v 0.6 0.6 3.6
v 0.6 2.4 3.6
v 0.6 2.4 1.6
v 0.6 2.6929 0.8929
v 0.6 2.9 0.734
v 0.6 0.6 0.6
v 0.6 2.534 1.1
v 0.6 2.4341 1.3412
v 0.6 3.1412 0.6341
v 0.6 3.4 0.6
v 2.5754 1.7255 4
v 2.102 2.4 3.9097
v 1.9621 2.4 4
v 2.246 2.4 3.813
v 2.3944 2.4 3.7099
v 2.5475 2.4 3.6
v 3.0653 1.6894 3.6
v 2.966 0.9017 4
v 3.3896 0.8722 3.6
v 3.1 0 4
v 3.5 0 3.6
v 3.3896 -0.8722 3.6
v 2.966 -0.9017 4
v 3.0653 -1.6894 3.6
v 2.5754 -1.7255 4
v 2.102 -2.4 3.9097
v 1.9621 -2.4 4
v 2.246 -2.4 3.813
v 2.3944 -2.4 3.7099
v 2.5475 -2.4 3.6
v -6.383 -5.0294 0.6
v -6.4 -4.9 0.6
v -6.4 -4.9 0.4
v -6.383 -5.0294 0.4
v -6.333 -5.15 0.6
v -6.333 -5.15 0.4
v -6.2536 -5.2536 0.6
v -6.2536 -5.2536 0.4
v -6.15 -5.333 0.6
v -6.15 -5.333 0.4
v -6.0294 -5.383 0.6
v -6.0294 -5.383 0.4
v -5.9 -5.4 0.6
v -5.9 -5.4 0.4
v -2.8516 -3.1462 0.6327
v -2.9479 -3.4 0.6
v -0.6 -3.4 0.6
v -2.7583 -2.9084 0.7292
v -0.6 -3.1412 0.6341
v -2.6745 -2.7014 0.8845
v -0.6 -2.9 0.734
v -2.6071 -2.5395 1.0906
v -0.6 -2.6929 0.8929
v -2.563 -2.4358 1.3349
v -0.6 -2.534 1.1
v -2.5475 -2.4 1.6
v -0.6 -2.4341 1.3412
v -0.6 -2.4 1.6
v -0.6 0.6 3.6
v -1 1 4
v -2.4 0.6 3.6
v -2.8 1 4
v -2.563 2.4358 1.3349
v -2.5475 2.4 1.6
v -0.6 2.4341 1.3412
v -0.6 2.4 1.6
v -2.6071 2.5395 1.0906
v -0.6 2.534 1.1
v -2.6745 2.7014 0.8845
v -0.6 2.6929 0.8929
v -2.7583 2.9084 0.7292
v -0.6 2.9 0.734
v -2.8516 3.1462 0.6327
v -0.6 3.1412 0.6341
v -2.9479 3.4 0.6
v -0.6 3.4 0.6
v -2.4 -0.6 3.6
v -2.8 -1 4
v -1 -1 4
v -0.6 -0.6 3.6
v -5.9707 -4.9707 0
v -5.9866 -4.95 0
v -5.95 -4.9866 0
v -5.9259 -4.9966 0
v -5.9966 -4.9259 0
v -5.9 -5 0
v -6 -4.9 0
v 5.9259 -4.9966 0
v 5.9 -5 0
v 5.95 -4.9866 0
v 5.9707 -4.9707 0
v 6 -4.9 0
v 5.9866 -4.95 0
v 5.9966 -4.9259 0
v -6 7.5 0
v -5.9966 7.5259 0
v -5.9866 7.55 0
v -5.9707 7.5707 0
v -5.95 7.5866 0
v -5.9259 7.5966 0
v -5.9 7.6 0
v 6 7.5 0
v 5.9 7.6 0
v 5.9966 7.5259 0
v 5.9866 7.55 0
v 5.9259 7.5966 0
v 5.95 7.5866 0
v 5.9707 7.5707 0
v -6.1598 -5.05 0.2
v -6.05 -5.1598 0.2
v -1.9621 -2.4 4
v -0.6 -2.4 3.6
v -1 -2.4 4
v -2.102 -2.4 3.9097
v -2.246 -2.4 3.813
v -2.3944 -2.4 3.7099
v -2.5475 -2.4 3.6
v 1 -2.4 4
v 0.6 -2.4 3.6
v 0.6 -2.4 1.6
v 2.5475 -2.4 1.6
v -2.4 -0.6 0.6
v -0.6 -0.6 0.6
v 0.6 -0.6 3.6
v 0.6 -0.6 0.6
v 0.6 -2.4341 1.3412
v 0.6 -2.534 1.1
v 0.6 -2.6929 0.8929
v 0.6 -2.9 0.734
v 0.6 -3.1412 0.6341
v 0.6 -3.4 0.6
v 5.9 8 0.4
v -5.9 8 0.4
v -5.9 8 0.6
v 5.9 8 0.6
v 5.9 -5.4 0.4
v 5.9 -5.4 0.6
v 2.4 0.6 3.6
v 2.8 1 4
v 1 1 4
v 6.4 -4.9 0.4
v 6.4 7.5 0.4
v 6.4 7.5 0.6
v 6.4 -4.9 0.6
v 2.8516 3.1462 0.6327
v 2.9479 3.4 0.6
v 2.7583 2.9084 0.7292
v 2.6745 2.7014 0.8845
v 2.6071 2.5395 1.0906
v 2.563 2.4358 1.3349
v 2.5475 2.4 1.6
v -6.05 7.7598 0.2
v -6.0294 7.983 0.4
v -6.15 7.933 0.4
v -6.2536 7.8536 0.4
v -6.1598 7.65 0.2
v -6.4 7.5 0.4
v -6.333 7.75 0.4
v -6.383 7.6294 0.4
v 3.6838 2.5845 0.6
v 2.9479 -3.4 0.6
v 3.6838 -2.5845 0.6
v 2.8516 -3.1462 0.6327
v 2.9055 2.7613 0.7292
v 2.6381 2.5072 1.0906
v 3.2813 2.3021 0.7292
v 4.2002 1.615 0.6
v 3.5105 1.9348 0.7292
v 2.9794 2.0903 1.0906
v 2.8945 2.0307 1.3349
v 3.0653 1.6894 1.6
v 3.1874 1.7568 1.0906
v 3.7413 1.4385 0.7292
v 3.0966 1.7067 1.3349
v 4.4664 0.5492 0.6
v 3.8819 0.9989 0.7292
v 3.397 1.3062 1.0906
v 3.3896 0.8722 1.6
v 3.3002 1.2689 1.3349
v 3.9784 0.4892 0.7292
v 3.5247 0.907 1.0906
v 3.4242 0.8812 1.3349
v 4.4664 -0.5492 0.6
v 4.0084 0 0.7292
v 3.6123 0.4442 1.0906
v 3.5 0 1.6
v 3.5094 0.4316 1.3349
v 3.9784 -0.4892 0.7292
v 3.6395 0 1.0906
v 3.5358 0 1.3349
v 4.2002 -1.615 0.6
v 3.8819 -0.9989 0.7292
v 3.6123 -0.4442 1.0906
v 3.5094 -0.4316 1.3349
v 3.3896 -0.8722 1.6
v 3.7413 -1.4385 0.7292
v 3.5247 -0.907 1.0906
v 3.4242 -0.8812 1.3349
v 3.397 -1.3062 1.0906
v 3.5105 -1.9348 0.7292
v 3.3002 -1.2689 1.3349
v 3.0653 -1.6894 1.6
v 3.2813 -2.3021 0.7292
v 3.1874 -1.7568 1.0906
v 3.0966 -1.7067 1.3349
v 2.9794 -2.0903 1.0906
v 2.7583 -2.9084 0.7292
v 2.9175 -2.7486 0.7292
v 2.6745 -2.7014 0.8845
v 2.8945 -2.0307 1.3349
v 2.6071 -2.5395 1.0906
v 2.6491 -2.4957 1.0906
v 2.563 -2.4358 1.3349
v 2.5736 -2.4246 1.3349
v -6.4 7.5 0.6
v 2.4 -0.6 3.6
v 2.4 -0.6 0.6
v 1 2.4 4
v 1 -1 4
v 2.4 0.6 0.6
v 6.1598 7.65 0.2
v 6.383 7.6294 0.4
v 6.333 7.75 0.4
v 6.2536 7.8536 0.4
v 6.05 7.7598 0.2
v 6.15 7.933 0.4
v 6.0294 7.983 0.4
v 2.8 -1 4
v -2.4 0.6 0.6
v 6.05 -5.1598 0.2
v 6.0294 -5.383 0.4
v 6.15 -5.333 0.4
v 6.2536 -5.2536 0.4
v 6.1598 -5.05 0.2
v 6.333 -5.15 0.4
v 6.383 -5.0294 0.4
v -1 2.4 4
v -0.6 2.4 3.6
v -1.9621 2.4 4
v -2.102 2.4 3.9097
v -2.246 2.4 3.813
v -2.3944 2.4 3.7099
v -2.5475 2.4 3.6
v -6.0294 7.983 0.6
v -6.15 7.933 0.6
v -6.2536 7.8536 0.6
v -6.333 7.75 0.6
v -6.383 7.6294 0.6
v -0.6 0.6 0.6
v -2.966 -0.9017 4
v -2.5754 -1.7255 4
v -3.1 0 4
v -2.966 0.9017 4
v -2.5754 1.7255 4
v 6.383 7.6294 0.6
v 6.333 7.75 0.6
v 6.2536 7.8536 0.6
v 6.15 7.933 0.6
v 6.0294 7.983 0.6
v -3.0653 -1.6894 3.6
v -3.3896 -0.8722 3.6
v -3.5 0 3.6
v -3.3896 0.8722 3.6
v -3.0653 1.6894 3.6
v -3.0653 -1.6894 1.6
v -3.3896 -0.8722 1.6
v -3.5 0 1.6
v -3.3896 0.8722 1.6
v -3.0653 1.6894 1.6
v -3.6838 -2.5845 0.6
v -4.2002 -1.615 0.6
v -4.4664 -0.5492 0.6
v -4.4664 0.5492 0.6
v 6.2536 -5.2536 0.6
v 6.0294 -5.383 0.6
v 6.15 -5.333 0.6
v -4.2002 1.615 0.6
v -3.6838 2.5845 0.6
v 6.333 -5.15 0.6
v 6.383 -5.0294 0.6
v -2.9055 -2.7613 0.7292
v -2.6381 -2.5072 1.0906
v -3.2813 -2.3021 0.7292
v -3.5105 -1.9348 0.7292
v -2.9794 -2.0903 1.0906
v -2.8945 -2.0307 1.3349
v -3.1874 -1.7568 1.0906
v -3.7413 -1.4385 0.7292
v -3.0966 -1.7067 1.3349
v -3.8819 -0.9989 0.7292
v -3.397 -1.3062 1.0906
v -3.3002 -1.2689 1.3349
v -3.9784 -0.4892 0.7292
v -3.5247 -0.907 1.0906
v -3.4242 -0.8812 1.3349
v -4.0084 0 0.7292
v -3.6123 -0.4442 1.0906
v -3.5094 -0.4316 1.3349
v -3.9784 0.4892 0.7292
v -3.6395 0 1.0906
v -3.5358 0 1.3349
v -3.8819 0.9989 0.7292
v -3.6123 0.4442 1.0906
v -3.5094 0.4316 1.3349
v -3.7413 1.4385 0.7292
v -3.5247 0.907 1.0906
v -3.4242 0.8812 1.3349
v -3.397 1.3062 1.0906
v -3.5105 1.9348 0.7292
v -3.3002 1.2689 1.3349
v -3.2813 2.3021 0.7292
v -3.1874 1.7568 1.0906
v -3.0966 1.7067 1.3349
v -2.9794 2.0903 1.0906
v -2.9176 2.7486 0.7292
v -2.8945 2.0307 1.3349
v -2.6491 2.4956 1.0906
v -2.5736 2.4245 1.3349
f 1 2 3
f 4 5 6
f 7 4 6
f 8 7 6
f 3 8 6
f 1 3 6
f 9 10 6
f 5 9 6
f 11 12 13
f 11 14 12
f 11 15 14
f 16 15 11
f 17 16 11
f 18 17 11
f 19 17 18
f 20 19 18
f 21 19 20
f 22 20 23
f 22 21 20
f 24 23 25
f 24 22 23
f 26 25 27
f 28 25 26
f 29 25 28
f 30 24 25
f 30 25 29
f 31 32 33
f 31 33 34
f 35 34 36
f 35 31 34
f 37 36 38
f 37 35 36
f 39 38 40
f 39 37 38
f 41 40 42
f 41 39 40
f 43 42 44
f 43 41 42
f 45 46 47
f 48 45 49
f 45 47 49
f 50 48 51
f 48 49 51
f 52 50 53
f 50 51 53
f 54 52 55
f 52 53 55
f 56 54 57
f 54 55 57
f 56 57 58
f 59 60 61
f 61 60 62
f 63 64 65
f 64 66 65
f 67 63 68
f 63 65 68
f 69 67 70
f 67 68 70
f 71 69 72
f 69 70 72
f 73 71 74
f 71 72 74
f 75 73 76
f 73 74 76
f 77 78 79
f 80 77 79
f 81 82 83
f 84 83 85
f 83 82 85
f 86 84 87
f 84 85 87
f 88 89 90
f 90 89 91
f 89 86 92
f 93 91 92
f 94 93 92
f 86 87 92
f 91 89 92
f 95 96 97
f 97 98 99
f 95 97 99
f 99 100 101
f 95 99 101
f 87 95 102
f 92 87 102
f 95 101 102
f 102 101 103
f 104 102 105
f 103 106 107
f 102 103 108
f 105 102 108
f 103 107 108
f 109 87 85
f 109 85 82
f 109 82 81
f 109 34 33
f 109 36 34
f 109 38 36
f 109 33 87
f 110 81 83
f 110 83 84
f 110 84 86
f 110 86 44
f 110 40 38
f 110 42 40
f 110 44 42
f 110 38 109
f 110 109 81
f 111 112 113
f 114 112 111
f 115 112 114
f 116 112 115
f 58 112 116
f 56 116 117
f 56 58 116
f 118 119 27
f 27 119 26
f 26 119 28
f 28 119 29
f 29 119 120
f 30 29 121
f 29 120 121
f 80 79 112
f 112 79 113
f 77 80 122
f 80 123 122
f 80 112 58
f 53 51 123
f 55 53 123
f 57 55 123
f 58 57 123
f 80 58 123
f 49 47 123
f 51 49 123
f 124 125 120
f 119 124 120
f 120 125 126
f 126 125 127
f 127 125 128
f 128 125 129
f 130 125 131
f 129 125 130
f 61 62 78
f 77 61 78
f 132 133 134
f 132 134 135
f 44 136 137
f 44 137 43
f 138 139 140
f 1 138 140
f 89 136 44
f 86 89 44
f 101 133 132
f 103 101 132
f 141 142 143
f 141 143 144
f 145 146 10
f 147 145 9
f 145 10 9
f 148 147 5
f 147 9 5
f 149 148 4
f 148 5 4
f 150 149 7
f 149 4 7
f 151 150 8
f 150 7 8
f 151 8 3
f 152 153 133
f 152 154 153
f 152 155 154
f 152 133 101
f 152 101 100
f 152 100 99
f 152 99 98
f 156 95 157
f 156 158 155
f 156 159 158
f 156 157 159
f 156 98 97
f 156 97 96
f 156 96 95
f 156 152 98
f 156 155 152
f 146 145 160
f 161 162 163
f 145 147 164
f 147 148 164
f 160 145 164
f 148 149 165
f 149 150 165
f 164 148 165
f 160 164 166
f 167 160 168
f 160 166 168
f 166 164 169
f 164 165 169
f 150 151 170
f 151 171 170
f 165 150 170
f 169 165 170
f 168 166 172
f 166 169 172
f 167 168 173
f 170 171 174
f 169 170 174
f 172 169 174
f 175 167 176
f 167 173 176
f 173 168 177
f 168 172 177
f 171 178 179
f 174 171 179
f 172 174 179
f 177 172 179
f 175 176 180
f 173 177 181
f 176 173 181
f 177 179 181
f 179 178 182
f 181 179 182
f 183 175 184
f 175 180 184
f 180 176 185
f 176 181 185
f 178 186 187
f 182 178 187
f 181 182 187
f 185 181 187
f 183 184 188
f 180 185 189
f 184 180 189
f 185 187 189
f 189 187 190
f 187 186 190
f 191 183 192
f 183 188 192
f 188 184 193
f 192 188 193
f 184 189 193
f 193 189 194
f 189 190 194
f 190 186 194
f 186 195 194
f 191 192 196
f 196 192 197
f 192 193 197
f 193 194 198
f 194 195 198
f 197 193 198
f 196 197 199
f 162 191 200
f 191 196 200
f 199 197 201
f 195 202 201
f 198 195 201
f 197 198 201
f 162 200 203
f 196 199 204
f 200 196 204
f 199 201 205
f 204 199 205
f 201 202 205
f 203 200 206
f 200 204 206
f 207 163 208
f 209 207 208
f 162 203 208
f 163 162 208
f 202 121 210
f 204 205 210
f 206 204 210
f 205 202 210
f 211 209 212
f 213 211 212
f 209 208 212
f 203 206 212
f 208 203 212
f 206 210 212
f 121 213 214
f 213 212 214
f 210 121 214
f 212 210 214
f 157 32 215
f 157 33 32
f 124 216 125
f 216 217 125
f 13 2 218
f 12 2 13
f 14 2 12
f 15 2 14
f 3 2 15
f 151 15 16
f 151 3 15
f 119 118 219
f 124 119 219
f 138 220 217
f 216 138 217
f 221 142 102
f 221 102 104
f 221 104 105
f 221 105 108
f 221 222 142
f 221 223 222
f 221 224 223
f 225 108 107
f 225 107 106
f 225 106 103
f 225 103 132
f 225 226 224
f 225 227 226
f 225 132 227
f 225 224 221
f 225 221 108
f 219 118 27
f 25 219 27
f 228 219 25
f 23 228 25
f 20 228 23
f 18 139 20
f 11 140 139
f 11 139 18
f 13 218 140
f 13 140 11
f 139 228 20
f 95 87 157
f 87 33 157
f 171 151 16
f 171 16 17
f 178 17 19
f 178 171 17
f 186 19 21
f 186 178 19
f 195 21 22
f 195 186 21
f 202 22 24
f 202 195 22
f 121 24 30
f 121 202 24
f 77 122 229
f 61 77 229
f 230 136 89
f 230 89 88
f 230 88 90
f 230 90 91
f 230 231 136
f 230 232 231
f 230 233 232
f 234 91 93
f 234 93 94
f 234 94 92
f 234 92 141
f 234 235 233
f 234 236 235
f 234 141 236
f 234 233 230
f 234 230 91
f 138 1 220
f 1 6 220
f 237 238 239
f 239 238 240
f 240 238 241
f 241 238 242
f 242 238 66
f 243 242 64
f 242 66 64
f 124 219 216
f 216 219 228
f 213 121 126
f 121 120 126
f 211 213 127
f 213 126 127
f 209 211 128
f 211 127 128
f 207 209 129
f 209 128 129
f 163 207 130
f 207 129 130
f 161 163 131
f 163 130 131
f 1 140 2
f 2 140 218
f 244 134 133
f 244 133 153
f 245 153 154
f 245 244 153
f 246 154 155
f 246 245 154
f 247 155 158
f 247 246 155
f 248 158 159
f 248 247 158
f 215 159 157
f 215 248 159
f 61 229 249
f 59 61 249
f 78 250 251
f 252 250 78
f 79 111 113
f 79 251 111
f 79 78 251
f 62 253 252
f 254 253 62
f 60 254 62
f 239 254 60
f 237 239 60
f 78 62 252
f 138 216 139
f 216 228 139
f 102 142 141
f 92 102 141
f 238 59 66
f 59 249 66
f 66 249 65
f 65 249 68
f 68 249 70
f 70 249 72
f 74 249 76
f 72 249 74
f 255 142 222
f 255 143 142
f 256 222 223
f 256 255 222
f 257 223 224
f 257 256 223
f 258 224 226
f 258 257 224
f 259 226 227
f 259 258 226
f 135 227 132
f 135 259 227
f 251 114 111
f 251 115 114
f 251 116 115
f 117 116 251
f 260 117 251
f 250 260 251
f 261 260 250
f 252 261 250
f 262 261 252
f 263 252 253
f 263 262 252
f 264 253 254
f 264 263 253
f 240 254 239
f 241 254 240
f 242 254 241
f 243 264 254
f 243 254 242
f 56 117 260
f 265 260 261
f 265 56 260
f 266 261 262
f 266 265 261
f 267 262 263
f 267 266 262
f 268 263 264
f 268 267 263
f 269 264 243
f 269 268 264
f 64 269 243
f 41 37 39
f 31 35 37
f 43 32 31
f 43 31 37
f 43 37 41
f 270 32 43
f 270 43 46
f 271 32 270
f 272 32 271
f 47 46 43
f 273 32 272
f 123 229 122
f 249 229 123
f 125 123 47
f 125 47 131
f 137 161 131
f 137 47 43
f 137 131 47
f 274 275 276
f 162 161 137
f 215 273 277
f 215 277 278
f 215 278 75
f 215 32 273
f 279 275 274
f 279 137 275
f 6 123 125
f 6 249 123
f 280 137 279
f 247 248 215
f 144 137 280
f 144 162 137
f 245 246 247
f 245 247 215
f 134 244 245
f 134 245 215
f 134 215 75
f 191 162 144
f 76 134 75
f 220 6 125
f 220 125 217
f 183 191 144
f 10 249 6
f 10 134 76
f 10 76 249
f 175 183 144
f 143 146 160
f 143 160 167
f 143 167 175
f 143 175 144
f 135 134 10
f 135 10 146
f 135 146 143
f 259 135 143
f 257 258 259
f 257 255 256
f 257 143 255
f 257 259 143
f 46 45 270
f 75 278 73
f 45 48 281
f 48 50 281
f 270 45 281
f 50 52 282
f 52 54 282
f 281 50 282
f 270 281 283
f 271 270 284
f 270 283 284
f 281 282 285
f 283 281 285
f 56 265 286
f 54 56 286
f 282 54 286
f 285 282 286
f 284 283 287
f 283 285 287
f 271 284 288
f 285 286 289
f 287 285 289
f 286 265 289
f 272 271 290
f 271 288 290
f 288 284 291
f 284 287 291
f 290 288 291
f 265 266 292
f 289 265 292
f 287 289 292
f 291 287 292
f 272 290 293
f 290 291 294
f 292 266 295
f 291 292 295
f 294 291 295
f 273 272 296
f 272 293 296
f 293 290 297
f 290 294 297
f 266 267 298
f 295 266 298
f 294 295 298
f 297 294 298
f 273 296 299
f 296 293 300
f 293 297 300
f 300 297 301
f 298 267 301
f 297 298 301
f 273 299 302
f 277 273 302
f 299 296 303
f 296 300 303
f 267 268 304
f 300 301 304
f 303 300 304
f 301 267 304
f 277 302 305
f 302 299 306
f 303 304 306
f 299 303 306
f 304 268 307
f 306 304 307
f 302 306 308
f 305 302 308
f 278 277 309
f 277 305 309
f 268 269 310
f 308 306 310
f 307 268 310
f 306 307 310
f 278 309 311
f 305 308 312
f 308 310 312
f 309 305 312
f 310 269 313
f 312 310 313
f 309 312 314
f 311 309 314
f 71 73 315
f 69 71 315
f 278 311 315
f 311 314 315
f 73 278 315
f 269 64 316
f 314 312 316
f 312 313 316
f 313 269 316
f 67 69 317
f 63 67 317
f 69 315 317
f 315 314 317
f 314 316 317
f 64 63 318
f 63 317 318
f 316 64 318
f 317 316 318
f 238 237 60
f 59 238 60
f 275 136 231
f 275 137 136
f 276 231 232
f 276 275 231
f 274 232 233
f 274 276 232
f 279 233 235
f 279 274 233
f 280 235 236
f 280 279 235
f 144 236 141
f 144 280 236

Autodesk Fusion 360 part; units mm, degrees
sketch "Sketch1" plane through (0, 0, 0) normal (0, 0, 1) x (1, 0, 0)
  line L0 (9, 9) -> (-9, 9) construction
  line L1 (-9, 9) -> (-9, -9) construction
  line L2 (-9, -9) -> (9, -9) construction
  line L3 (9, -9) -> (9, 9) construction
  line L4 (9, 9) -> (-9, -9) construction
  line L5 (-9, 9) -> (9, -9) construction
  line L6 (-6.4, 8) -> (6.4, 8)
  line L7 (6.4, 8) -> (6.4, -5.4)
  line L8 (6.4, -5.4) -> (-6.4, -5.4)
  line L9 (-6.4, -5.4) -> (-6.4, 8)
  circle A0 centre (0, 0) radius 3.5
  line L10 (2.4, -0.6) -> (-2.4, -0.6)
  line L11 (-2.4, -0.6) -> (-2.4, 0.6)
  line L12 (-2.4, 0.6) -> (2.4, 0.6)
  line L13 (2.4, 0.6) -> (2.4, -0.6)
  line L14 (2.4, -0.6) -> (-2.4, 0.6) construction
  line L15 (-2.4, -0.6) -> (2.4, 0.6) construction
  line L16 (0.6, -2.4) -> (-0.6, -2.4)
  line L17 (-0.6, -2.4) -> (-0.6, 2.4)
  line L18 (-0.6, 2.4) -> (0.6, 2.4)
  line L19 (0.6, 2.4) -> (0.6, -2.4)
  line L20 (0.6, -2.4) -> (-0.6, 2.4) construction
  line L21 (-0.6, -2.4) -> (0.6, 2.4) construction
  line L22 (-0.6, 2.4) -> (-2.5475, 2.4)
  line L23 (0.6, 2.4) -> (2.5475, 2.4)
  line L24 (-0.6, -2.4) -> (-2.5475, -2.4)
  line L25 (0.6, -2.4) -> (2.5475, -2.4)
  dimension "d1" = 18
  dimension "d2" = 18
  dimension "d3" = 3.6
  dimension "d4" = 1
  dimension "d5" = 2.6
  dimension "d6" = 2.6
  dimension "d7" = 7
  dimension "d8" = 4.8
  dimension "d9" = 1.2
  dimension "d10" = 1.2
  dimension "d11" = 4.8
extrude "Extrude1" add sketch "Sketch1" along normal blind 0.6 contours L6 L7 L8 L9 | A0 L10 L12 L13 L19 L23 L25 | A0 L18 L22 L23 | A0 L16 L24 L25 | A0 L10 L11 L12 L17 L22 L24 | L12 L17 L18 L19 | L10 L16 L17 L19 | L10 L12 L17 L19 | L10 L12 L13 L19 | L10 L11 L12 L17
extrude "Extrude2" add sketch "Sketch1" along normal blind 4 contours A0 L10 L12 L13 L19 L23 L25 | A0 L10 L11 L12 L17 L22 L24
fillet "Fillet1" radius 1 6 edges at (-1.5738, -2.4, 0.6) (-3.5, 0, 0.6) (1.5738, -2.4, 0.6) (3.5, 0, 0.6) (1.5738, 2.4, 0.6) (-1.5738, 2.4, 0.6)
fillet "Fillet1" radius 0.5 4 edges at (6.4, 8, 0.3) (-6.4, 8, 0.3) (6.4, -5.4, 0.3) (-6.4, -5.4, 0.3)
chamfer "Chamfer1" distance 0.4 angle 45 20 edges at (-6.2536, 7.8536, 0) (0, 8, 0) (6.2536, 7.8536, 0) (6.4, 1.3, 0) (6.2536, -5.2536, 0) (0, -5.4, 0) (-6.2536, -5.2536, 0) (-6.4, 1.3, 0) (-0.6, 1.5, 4) (-1.5, 0.6, 4) (-2.4, 0, 4) (-1.5, -0.6, 4) (-0.6, -1.5, 4) (0.6, -1.5, 4) (1.5, -0.6, 4) (2.4, 0, 4) (1.5, 0.6, 4) (0.6, 1.5, 4) (3.5, 0, 4) (-3.5, 0, 4)
